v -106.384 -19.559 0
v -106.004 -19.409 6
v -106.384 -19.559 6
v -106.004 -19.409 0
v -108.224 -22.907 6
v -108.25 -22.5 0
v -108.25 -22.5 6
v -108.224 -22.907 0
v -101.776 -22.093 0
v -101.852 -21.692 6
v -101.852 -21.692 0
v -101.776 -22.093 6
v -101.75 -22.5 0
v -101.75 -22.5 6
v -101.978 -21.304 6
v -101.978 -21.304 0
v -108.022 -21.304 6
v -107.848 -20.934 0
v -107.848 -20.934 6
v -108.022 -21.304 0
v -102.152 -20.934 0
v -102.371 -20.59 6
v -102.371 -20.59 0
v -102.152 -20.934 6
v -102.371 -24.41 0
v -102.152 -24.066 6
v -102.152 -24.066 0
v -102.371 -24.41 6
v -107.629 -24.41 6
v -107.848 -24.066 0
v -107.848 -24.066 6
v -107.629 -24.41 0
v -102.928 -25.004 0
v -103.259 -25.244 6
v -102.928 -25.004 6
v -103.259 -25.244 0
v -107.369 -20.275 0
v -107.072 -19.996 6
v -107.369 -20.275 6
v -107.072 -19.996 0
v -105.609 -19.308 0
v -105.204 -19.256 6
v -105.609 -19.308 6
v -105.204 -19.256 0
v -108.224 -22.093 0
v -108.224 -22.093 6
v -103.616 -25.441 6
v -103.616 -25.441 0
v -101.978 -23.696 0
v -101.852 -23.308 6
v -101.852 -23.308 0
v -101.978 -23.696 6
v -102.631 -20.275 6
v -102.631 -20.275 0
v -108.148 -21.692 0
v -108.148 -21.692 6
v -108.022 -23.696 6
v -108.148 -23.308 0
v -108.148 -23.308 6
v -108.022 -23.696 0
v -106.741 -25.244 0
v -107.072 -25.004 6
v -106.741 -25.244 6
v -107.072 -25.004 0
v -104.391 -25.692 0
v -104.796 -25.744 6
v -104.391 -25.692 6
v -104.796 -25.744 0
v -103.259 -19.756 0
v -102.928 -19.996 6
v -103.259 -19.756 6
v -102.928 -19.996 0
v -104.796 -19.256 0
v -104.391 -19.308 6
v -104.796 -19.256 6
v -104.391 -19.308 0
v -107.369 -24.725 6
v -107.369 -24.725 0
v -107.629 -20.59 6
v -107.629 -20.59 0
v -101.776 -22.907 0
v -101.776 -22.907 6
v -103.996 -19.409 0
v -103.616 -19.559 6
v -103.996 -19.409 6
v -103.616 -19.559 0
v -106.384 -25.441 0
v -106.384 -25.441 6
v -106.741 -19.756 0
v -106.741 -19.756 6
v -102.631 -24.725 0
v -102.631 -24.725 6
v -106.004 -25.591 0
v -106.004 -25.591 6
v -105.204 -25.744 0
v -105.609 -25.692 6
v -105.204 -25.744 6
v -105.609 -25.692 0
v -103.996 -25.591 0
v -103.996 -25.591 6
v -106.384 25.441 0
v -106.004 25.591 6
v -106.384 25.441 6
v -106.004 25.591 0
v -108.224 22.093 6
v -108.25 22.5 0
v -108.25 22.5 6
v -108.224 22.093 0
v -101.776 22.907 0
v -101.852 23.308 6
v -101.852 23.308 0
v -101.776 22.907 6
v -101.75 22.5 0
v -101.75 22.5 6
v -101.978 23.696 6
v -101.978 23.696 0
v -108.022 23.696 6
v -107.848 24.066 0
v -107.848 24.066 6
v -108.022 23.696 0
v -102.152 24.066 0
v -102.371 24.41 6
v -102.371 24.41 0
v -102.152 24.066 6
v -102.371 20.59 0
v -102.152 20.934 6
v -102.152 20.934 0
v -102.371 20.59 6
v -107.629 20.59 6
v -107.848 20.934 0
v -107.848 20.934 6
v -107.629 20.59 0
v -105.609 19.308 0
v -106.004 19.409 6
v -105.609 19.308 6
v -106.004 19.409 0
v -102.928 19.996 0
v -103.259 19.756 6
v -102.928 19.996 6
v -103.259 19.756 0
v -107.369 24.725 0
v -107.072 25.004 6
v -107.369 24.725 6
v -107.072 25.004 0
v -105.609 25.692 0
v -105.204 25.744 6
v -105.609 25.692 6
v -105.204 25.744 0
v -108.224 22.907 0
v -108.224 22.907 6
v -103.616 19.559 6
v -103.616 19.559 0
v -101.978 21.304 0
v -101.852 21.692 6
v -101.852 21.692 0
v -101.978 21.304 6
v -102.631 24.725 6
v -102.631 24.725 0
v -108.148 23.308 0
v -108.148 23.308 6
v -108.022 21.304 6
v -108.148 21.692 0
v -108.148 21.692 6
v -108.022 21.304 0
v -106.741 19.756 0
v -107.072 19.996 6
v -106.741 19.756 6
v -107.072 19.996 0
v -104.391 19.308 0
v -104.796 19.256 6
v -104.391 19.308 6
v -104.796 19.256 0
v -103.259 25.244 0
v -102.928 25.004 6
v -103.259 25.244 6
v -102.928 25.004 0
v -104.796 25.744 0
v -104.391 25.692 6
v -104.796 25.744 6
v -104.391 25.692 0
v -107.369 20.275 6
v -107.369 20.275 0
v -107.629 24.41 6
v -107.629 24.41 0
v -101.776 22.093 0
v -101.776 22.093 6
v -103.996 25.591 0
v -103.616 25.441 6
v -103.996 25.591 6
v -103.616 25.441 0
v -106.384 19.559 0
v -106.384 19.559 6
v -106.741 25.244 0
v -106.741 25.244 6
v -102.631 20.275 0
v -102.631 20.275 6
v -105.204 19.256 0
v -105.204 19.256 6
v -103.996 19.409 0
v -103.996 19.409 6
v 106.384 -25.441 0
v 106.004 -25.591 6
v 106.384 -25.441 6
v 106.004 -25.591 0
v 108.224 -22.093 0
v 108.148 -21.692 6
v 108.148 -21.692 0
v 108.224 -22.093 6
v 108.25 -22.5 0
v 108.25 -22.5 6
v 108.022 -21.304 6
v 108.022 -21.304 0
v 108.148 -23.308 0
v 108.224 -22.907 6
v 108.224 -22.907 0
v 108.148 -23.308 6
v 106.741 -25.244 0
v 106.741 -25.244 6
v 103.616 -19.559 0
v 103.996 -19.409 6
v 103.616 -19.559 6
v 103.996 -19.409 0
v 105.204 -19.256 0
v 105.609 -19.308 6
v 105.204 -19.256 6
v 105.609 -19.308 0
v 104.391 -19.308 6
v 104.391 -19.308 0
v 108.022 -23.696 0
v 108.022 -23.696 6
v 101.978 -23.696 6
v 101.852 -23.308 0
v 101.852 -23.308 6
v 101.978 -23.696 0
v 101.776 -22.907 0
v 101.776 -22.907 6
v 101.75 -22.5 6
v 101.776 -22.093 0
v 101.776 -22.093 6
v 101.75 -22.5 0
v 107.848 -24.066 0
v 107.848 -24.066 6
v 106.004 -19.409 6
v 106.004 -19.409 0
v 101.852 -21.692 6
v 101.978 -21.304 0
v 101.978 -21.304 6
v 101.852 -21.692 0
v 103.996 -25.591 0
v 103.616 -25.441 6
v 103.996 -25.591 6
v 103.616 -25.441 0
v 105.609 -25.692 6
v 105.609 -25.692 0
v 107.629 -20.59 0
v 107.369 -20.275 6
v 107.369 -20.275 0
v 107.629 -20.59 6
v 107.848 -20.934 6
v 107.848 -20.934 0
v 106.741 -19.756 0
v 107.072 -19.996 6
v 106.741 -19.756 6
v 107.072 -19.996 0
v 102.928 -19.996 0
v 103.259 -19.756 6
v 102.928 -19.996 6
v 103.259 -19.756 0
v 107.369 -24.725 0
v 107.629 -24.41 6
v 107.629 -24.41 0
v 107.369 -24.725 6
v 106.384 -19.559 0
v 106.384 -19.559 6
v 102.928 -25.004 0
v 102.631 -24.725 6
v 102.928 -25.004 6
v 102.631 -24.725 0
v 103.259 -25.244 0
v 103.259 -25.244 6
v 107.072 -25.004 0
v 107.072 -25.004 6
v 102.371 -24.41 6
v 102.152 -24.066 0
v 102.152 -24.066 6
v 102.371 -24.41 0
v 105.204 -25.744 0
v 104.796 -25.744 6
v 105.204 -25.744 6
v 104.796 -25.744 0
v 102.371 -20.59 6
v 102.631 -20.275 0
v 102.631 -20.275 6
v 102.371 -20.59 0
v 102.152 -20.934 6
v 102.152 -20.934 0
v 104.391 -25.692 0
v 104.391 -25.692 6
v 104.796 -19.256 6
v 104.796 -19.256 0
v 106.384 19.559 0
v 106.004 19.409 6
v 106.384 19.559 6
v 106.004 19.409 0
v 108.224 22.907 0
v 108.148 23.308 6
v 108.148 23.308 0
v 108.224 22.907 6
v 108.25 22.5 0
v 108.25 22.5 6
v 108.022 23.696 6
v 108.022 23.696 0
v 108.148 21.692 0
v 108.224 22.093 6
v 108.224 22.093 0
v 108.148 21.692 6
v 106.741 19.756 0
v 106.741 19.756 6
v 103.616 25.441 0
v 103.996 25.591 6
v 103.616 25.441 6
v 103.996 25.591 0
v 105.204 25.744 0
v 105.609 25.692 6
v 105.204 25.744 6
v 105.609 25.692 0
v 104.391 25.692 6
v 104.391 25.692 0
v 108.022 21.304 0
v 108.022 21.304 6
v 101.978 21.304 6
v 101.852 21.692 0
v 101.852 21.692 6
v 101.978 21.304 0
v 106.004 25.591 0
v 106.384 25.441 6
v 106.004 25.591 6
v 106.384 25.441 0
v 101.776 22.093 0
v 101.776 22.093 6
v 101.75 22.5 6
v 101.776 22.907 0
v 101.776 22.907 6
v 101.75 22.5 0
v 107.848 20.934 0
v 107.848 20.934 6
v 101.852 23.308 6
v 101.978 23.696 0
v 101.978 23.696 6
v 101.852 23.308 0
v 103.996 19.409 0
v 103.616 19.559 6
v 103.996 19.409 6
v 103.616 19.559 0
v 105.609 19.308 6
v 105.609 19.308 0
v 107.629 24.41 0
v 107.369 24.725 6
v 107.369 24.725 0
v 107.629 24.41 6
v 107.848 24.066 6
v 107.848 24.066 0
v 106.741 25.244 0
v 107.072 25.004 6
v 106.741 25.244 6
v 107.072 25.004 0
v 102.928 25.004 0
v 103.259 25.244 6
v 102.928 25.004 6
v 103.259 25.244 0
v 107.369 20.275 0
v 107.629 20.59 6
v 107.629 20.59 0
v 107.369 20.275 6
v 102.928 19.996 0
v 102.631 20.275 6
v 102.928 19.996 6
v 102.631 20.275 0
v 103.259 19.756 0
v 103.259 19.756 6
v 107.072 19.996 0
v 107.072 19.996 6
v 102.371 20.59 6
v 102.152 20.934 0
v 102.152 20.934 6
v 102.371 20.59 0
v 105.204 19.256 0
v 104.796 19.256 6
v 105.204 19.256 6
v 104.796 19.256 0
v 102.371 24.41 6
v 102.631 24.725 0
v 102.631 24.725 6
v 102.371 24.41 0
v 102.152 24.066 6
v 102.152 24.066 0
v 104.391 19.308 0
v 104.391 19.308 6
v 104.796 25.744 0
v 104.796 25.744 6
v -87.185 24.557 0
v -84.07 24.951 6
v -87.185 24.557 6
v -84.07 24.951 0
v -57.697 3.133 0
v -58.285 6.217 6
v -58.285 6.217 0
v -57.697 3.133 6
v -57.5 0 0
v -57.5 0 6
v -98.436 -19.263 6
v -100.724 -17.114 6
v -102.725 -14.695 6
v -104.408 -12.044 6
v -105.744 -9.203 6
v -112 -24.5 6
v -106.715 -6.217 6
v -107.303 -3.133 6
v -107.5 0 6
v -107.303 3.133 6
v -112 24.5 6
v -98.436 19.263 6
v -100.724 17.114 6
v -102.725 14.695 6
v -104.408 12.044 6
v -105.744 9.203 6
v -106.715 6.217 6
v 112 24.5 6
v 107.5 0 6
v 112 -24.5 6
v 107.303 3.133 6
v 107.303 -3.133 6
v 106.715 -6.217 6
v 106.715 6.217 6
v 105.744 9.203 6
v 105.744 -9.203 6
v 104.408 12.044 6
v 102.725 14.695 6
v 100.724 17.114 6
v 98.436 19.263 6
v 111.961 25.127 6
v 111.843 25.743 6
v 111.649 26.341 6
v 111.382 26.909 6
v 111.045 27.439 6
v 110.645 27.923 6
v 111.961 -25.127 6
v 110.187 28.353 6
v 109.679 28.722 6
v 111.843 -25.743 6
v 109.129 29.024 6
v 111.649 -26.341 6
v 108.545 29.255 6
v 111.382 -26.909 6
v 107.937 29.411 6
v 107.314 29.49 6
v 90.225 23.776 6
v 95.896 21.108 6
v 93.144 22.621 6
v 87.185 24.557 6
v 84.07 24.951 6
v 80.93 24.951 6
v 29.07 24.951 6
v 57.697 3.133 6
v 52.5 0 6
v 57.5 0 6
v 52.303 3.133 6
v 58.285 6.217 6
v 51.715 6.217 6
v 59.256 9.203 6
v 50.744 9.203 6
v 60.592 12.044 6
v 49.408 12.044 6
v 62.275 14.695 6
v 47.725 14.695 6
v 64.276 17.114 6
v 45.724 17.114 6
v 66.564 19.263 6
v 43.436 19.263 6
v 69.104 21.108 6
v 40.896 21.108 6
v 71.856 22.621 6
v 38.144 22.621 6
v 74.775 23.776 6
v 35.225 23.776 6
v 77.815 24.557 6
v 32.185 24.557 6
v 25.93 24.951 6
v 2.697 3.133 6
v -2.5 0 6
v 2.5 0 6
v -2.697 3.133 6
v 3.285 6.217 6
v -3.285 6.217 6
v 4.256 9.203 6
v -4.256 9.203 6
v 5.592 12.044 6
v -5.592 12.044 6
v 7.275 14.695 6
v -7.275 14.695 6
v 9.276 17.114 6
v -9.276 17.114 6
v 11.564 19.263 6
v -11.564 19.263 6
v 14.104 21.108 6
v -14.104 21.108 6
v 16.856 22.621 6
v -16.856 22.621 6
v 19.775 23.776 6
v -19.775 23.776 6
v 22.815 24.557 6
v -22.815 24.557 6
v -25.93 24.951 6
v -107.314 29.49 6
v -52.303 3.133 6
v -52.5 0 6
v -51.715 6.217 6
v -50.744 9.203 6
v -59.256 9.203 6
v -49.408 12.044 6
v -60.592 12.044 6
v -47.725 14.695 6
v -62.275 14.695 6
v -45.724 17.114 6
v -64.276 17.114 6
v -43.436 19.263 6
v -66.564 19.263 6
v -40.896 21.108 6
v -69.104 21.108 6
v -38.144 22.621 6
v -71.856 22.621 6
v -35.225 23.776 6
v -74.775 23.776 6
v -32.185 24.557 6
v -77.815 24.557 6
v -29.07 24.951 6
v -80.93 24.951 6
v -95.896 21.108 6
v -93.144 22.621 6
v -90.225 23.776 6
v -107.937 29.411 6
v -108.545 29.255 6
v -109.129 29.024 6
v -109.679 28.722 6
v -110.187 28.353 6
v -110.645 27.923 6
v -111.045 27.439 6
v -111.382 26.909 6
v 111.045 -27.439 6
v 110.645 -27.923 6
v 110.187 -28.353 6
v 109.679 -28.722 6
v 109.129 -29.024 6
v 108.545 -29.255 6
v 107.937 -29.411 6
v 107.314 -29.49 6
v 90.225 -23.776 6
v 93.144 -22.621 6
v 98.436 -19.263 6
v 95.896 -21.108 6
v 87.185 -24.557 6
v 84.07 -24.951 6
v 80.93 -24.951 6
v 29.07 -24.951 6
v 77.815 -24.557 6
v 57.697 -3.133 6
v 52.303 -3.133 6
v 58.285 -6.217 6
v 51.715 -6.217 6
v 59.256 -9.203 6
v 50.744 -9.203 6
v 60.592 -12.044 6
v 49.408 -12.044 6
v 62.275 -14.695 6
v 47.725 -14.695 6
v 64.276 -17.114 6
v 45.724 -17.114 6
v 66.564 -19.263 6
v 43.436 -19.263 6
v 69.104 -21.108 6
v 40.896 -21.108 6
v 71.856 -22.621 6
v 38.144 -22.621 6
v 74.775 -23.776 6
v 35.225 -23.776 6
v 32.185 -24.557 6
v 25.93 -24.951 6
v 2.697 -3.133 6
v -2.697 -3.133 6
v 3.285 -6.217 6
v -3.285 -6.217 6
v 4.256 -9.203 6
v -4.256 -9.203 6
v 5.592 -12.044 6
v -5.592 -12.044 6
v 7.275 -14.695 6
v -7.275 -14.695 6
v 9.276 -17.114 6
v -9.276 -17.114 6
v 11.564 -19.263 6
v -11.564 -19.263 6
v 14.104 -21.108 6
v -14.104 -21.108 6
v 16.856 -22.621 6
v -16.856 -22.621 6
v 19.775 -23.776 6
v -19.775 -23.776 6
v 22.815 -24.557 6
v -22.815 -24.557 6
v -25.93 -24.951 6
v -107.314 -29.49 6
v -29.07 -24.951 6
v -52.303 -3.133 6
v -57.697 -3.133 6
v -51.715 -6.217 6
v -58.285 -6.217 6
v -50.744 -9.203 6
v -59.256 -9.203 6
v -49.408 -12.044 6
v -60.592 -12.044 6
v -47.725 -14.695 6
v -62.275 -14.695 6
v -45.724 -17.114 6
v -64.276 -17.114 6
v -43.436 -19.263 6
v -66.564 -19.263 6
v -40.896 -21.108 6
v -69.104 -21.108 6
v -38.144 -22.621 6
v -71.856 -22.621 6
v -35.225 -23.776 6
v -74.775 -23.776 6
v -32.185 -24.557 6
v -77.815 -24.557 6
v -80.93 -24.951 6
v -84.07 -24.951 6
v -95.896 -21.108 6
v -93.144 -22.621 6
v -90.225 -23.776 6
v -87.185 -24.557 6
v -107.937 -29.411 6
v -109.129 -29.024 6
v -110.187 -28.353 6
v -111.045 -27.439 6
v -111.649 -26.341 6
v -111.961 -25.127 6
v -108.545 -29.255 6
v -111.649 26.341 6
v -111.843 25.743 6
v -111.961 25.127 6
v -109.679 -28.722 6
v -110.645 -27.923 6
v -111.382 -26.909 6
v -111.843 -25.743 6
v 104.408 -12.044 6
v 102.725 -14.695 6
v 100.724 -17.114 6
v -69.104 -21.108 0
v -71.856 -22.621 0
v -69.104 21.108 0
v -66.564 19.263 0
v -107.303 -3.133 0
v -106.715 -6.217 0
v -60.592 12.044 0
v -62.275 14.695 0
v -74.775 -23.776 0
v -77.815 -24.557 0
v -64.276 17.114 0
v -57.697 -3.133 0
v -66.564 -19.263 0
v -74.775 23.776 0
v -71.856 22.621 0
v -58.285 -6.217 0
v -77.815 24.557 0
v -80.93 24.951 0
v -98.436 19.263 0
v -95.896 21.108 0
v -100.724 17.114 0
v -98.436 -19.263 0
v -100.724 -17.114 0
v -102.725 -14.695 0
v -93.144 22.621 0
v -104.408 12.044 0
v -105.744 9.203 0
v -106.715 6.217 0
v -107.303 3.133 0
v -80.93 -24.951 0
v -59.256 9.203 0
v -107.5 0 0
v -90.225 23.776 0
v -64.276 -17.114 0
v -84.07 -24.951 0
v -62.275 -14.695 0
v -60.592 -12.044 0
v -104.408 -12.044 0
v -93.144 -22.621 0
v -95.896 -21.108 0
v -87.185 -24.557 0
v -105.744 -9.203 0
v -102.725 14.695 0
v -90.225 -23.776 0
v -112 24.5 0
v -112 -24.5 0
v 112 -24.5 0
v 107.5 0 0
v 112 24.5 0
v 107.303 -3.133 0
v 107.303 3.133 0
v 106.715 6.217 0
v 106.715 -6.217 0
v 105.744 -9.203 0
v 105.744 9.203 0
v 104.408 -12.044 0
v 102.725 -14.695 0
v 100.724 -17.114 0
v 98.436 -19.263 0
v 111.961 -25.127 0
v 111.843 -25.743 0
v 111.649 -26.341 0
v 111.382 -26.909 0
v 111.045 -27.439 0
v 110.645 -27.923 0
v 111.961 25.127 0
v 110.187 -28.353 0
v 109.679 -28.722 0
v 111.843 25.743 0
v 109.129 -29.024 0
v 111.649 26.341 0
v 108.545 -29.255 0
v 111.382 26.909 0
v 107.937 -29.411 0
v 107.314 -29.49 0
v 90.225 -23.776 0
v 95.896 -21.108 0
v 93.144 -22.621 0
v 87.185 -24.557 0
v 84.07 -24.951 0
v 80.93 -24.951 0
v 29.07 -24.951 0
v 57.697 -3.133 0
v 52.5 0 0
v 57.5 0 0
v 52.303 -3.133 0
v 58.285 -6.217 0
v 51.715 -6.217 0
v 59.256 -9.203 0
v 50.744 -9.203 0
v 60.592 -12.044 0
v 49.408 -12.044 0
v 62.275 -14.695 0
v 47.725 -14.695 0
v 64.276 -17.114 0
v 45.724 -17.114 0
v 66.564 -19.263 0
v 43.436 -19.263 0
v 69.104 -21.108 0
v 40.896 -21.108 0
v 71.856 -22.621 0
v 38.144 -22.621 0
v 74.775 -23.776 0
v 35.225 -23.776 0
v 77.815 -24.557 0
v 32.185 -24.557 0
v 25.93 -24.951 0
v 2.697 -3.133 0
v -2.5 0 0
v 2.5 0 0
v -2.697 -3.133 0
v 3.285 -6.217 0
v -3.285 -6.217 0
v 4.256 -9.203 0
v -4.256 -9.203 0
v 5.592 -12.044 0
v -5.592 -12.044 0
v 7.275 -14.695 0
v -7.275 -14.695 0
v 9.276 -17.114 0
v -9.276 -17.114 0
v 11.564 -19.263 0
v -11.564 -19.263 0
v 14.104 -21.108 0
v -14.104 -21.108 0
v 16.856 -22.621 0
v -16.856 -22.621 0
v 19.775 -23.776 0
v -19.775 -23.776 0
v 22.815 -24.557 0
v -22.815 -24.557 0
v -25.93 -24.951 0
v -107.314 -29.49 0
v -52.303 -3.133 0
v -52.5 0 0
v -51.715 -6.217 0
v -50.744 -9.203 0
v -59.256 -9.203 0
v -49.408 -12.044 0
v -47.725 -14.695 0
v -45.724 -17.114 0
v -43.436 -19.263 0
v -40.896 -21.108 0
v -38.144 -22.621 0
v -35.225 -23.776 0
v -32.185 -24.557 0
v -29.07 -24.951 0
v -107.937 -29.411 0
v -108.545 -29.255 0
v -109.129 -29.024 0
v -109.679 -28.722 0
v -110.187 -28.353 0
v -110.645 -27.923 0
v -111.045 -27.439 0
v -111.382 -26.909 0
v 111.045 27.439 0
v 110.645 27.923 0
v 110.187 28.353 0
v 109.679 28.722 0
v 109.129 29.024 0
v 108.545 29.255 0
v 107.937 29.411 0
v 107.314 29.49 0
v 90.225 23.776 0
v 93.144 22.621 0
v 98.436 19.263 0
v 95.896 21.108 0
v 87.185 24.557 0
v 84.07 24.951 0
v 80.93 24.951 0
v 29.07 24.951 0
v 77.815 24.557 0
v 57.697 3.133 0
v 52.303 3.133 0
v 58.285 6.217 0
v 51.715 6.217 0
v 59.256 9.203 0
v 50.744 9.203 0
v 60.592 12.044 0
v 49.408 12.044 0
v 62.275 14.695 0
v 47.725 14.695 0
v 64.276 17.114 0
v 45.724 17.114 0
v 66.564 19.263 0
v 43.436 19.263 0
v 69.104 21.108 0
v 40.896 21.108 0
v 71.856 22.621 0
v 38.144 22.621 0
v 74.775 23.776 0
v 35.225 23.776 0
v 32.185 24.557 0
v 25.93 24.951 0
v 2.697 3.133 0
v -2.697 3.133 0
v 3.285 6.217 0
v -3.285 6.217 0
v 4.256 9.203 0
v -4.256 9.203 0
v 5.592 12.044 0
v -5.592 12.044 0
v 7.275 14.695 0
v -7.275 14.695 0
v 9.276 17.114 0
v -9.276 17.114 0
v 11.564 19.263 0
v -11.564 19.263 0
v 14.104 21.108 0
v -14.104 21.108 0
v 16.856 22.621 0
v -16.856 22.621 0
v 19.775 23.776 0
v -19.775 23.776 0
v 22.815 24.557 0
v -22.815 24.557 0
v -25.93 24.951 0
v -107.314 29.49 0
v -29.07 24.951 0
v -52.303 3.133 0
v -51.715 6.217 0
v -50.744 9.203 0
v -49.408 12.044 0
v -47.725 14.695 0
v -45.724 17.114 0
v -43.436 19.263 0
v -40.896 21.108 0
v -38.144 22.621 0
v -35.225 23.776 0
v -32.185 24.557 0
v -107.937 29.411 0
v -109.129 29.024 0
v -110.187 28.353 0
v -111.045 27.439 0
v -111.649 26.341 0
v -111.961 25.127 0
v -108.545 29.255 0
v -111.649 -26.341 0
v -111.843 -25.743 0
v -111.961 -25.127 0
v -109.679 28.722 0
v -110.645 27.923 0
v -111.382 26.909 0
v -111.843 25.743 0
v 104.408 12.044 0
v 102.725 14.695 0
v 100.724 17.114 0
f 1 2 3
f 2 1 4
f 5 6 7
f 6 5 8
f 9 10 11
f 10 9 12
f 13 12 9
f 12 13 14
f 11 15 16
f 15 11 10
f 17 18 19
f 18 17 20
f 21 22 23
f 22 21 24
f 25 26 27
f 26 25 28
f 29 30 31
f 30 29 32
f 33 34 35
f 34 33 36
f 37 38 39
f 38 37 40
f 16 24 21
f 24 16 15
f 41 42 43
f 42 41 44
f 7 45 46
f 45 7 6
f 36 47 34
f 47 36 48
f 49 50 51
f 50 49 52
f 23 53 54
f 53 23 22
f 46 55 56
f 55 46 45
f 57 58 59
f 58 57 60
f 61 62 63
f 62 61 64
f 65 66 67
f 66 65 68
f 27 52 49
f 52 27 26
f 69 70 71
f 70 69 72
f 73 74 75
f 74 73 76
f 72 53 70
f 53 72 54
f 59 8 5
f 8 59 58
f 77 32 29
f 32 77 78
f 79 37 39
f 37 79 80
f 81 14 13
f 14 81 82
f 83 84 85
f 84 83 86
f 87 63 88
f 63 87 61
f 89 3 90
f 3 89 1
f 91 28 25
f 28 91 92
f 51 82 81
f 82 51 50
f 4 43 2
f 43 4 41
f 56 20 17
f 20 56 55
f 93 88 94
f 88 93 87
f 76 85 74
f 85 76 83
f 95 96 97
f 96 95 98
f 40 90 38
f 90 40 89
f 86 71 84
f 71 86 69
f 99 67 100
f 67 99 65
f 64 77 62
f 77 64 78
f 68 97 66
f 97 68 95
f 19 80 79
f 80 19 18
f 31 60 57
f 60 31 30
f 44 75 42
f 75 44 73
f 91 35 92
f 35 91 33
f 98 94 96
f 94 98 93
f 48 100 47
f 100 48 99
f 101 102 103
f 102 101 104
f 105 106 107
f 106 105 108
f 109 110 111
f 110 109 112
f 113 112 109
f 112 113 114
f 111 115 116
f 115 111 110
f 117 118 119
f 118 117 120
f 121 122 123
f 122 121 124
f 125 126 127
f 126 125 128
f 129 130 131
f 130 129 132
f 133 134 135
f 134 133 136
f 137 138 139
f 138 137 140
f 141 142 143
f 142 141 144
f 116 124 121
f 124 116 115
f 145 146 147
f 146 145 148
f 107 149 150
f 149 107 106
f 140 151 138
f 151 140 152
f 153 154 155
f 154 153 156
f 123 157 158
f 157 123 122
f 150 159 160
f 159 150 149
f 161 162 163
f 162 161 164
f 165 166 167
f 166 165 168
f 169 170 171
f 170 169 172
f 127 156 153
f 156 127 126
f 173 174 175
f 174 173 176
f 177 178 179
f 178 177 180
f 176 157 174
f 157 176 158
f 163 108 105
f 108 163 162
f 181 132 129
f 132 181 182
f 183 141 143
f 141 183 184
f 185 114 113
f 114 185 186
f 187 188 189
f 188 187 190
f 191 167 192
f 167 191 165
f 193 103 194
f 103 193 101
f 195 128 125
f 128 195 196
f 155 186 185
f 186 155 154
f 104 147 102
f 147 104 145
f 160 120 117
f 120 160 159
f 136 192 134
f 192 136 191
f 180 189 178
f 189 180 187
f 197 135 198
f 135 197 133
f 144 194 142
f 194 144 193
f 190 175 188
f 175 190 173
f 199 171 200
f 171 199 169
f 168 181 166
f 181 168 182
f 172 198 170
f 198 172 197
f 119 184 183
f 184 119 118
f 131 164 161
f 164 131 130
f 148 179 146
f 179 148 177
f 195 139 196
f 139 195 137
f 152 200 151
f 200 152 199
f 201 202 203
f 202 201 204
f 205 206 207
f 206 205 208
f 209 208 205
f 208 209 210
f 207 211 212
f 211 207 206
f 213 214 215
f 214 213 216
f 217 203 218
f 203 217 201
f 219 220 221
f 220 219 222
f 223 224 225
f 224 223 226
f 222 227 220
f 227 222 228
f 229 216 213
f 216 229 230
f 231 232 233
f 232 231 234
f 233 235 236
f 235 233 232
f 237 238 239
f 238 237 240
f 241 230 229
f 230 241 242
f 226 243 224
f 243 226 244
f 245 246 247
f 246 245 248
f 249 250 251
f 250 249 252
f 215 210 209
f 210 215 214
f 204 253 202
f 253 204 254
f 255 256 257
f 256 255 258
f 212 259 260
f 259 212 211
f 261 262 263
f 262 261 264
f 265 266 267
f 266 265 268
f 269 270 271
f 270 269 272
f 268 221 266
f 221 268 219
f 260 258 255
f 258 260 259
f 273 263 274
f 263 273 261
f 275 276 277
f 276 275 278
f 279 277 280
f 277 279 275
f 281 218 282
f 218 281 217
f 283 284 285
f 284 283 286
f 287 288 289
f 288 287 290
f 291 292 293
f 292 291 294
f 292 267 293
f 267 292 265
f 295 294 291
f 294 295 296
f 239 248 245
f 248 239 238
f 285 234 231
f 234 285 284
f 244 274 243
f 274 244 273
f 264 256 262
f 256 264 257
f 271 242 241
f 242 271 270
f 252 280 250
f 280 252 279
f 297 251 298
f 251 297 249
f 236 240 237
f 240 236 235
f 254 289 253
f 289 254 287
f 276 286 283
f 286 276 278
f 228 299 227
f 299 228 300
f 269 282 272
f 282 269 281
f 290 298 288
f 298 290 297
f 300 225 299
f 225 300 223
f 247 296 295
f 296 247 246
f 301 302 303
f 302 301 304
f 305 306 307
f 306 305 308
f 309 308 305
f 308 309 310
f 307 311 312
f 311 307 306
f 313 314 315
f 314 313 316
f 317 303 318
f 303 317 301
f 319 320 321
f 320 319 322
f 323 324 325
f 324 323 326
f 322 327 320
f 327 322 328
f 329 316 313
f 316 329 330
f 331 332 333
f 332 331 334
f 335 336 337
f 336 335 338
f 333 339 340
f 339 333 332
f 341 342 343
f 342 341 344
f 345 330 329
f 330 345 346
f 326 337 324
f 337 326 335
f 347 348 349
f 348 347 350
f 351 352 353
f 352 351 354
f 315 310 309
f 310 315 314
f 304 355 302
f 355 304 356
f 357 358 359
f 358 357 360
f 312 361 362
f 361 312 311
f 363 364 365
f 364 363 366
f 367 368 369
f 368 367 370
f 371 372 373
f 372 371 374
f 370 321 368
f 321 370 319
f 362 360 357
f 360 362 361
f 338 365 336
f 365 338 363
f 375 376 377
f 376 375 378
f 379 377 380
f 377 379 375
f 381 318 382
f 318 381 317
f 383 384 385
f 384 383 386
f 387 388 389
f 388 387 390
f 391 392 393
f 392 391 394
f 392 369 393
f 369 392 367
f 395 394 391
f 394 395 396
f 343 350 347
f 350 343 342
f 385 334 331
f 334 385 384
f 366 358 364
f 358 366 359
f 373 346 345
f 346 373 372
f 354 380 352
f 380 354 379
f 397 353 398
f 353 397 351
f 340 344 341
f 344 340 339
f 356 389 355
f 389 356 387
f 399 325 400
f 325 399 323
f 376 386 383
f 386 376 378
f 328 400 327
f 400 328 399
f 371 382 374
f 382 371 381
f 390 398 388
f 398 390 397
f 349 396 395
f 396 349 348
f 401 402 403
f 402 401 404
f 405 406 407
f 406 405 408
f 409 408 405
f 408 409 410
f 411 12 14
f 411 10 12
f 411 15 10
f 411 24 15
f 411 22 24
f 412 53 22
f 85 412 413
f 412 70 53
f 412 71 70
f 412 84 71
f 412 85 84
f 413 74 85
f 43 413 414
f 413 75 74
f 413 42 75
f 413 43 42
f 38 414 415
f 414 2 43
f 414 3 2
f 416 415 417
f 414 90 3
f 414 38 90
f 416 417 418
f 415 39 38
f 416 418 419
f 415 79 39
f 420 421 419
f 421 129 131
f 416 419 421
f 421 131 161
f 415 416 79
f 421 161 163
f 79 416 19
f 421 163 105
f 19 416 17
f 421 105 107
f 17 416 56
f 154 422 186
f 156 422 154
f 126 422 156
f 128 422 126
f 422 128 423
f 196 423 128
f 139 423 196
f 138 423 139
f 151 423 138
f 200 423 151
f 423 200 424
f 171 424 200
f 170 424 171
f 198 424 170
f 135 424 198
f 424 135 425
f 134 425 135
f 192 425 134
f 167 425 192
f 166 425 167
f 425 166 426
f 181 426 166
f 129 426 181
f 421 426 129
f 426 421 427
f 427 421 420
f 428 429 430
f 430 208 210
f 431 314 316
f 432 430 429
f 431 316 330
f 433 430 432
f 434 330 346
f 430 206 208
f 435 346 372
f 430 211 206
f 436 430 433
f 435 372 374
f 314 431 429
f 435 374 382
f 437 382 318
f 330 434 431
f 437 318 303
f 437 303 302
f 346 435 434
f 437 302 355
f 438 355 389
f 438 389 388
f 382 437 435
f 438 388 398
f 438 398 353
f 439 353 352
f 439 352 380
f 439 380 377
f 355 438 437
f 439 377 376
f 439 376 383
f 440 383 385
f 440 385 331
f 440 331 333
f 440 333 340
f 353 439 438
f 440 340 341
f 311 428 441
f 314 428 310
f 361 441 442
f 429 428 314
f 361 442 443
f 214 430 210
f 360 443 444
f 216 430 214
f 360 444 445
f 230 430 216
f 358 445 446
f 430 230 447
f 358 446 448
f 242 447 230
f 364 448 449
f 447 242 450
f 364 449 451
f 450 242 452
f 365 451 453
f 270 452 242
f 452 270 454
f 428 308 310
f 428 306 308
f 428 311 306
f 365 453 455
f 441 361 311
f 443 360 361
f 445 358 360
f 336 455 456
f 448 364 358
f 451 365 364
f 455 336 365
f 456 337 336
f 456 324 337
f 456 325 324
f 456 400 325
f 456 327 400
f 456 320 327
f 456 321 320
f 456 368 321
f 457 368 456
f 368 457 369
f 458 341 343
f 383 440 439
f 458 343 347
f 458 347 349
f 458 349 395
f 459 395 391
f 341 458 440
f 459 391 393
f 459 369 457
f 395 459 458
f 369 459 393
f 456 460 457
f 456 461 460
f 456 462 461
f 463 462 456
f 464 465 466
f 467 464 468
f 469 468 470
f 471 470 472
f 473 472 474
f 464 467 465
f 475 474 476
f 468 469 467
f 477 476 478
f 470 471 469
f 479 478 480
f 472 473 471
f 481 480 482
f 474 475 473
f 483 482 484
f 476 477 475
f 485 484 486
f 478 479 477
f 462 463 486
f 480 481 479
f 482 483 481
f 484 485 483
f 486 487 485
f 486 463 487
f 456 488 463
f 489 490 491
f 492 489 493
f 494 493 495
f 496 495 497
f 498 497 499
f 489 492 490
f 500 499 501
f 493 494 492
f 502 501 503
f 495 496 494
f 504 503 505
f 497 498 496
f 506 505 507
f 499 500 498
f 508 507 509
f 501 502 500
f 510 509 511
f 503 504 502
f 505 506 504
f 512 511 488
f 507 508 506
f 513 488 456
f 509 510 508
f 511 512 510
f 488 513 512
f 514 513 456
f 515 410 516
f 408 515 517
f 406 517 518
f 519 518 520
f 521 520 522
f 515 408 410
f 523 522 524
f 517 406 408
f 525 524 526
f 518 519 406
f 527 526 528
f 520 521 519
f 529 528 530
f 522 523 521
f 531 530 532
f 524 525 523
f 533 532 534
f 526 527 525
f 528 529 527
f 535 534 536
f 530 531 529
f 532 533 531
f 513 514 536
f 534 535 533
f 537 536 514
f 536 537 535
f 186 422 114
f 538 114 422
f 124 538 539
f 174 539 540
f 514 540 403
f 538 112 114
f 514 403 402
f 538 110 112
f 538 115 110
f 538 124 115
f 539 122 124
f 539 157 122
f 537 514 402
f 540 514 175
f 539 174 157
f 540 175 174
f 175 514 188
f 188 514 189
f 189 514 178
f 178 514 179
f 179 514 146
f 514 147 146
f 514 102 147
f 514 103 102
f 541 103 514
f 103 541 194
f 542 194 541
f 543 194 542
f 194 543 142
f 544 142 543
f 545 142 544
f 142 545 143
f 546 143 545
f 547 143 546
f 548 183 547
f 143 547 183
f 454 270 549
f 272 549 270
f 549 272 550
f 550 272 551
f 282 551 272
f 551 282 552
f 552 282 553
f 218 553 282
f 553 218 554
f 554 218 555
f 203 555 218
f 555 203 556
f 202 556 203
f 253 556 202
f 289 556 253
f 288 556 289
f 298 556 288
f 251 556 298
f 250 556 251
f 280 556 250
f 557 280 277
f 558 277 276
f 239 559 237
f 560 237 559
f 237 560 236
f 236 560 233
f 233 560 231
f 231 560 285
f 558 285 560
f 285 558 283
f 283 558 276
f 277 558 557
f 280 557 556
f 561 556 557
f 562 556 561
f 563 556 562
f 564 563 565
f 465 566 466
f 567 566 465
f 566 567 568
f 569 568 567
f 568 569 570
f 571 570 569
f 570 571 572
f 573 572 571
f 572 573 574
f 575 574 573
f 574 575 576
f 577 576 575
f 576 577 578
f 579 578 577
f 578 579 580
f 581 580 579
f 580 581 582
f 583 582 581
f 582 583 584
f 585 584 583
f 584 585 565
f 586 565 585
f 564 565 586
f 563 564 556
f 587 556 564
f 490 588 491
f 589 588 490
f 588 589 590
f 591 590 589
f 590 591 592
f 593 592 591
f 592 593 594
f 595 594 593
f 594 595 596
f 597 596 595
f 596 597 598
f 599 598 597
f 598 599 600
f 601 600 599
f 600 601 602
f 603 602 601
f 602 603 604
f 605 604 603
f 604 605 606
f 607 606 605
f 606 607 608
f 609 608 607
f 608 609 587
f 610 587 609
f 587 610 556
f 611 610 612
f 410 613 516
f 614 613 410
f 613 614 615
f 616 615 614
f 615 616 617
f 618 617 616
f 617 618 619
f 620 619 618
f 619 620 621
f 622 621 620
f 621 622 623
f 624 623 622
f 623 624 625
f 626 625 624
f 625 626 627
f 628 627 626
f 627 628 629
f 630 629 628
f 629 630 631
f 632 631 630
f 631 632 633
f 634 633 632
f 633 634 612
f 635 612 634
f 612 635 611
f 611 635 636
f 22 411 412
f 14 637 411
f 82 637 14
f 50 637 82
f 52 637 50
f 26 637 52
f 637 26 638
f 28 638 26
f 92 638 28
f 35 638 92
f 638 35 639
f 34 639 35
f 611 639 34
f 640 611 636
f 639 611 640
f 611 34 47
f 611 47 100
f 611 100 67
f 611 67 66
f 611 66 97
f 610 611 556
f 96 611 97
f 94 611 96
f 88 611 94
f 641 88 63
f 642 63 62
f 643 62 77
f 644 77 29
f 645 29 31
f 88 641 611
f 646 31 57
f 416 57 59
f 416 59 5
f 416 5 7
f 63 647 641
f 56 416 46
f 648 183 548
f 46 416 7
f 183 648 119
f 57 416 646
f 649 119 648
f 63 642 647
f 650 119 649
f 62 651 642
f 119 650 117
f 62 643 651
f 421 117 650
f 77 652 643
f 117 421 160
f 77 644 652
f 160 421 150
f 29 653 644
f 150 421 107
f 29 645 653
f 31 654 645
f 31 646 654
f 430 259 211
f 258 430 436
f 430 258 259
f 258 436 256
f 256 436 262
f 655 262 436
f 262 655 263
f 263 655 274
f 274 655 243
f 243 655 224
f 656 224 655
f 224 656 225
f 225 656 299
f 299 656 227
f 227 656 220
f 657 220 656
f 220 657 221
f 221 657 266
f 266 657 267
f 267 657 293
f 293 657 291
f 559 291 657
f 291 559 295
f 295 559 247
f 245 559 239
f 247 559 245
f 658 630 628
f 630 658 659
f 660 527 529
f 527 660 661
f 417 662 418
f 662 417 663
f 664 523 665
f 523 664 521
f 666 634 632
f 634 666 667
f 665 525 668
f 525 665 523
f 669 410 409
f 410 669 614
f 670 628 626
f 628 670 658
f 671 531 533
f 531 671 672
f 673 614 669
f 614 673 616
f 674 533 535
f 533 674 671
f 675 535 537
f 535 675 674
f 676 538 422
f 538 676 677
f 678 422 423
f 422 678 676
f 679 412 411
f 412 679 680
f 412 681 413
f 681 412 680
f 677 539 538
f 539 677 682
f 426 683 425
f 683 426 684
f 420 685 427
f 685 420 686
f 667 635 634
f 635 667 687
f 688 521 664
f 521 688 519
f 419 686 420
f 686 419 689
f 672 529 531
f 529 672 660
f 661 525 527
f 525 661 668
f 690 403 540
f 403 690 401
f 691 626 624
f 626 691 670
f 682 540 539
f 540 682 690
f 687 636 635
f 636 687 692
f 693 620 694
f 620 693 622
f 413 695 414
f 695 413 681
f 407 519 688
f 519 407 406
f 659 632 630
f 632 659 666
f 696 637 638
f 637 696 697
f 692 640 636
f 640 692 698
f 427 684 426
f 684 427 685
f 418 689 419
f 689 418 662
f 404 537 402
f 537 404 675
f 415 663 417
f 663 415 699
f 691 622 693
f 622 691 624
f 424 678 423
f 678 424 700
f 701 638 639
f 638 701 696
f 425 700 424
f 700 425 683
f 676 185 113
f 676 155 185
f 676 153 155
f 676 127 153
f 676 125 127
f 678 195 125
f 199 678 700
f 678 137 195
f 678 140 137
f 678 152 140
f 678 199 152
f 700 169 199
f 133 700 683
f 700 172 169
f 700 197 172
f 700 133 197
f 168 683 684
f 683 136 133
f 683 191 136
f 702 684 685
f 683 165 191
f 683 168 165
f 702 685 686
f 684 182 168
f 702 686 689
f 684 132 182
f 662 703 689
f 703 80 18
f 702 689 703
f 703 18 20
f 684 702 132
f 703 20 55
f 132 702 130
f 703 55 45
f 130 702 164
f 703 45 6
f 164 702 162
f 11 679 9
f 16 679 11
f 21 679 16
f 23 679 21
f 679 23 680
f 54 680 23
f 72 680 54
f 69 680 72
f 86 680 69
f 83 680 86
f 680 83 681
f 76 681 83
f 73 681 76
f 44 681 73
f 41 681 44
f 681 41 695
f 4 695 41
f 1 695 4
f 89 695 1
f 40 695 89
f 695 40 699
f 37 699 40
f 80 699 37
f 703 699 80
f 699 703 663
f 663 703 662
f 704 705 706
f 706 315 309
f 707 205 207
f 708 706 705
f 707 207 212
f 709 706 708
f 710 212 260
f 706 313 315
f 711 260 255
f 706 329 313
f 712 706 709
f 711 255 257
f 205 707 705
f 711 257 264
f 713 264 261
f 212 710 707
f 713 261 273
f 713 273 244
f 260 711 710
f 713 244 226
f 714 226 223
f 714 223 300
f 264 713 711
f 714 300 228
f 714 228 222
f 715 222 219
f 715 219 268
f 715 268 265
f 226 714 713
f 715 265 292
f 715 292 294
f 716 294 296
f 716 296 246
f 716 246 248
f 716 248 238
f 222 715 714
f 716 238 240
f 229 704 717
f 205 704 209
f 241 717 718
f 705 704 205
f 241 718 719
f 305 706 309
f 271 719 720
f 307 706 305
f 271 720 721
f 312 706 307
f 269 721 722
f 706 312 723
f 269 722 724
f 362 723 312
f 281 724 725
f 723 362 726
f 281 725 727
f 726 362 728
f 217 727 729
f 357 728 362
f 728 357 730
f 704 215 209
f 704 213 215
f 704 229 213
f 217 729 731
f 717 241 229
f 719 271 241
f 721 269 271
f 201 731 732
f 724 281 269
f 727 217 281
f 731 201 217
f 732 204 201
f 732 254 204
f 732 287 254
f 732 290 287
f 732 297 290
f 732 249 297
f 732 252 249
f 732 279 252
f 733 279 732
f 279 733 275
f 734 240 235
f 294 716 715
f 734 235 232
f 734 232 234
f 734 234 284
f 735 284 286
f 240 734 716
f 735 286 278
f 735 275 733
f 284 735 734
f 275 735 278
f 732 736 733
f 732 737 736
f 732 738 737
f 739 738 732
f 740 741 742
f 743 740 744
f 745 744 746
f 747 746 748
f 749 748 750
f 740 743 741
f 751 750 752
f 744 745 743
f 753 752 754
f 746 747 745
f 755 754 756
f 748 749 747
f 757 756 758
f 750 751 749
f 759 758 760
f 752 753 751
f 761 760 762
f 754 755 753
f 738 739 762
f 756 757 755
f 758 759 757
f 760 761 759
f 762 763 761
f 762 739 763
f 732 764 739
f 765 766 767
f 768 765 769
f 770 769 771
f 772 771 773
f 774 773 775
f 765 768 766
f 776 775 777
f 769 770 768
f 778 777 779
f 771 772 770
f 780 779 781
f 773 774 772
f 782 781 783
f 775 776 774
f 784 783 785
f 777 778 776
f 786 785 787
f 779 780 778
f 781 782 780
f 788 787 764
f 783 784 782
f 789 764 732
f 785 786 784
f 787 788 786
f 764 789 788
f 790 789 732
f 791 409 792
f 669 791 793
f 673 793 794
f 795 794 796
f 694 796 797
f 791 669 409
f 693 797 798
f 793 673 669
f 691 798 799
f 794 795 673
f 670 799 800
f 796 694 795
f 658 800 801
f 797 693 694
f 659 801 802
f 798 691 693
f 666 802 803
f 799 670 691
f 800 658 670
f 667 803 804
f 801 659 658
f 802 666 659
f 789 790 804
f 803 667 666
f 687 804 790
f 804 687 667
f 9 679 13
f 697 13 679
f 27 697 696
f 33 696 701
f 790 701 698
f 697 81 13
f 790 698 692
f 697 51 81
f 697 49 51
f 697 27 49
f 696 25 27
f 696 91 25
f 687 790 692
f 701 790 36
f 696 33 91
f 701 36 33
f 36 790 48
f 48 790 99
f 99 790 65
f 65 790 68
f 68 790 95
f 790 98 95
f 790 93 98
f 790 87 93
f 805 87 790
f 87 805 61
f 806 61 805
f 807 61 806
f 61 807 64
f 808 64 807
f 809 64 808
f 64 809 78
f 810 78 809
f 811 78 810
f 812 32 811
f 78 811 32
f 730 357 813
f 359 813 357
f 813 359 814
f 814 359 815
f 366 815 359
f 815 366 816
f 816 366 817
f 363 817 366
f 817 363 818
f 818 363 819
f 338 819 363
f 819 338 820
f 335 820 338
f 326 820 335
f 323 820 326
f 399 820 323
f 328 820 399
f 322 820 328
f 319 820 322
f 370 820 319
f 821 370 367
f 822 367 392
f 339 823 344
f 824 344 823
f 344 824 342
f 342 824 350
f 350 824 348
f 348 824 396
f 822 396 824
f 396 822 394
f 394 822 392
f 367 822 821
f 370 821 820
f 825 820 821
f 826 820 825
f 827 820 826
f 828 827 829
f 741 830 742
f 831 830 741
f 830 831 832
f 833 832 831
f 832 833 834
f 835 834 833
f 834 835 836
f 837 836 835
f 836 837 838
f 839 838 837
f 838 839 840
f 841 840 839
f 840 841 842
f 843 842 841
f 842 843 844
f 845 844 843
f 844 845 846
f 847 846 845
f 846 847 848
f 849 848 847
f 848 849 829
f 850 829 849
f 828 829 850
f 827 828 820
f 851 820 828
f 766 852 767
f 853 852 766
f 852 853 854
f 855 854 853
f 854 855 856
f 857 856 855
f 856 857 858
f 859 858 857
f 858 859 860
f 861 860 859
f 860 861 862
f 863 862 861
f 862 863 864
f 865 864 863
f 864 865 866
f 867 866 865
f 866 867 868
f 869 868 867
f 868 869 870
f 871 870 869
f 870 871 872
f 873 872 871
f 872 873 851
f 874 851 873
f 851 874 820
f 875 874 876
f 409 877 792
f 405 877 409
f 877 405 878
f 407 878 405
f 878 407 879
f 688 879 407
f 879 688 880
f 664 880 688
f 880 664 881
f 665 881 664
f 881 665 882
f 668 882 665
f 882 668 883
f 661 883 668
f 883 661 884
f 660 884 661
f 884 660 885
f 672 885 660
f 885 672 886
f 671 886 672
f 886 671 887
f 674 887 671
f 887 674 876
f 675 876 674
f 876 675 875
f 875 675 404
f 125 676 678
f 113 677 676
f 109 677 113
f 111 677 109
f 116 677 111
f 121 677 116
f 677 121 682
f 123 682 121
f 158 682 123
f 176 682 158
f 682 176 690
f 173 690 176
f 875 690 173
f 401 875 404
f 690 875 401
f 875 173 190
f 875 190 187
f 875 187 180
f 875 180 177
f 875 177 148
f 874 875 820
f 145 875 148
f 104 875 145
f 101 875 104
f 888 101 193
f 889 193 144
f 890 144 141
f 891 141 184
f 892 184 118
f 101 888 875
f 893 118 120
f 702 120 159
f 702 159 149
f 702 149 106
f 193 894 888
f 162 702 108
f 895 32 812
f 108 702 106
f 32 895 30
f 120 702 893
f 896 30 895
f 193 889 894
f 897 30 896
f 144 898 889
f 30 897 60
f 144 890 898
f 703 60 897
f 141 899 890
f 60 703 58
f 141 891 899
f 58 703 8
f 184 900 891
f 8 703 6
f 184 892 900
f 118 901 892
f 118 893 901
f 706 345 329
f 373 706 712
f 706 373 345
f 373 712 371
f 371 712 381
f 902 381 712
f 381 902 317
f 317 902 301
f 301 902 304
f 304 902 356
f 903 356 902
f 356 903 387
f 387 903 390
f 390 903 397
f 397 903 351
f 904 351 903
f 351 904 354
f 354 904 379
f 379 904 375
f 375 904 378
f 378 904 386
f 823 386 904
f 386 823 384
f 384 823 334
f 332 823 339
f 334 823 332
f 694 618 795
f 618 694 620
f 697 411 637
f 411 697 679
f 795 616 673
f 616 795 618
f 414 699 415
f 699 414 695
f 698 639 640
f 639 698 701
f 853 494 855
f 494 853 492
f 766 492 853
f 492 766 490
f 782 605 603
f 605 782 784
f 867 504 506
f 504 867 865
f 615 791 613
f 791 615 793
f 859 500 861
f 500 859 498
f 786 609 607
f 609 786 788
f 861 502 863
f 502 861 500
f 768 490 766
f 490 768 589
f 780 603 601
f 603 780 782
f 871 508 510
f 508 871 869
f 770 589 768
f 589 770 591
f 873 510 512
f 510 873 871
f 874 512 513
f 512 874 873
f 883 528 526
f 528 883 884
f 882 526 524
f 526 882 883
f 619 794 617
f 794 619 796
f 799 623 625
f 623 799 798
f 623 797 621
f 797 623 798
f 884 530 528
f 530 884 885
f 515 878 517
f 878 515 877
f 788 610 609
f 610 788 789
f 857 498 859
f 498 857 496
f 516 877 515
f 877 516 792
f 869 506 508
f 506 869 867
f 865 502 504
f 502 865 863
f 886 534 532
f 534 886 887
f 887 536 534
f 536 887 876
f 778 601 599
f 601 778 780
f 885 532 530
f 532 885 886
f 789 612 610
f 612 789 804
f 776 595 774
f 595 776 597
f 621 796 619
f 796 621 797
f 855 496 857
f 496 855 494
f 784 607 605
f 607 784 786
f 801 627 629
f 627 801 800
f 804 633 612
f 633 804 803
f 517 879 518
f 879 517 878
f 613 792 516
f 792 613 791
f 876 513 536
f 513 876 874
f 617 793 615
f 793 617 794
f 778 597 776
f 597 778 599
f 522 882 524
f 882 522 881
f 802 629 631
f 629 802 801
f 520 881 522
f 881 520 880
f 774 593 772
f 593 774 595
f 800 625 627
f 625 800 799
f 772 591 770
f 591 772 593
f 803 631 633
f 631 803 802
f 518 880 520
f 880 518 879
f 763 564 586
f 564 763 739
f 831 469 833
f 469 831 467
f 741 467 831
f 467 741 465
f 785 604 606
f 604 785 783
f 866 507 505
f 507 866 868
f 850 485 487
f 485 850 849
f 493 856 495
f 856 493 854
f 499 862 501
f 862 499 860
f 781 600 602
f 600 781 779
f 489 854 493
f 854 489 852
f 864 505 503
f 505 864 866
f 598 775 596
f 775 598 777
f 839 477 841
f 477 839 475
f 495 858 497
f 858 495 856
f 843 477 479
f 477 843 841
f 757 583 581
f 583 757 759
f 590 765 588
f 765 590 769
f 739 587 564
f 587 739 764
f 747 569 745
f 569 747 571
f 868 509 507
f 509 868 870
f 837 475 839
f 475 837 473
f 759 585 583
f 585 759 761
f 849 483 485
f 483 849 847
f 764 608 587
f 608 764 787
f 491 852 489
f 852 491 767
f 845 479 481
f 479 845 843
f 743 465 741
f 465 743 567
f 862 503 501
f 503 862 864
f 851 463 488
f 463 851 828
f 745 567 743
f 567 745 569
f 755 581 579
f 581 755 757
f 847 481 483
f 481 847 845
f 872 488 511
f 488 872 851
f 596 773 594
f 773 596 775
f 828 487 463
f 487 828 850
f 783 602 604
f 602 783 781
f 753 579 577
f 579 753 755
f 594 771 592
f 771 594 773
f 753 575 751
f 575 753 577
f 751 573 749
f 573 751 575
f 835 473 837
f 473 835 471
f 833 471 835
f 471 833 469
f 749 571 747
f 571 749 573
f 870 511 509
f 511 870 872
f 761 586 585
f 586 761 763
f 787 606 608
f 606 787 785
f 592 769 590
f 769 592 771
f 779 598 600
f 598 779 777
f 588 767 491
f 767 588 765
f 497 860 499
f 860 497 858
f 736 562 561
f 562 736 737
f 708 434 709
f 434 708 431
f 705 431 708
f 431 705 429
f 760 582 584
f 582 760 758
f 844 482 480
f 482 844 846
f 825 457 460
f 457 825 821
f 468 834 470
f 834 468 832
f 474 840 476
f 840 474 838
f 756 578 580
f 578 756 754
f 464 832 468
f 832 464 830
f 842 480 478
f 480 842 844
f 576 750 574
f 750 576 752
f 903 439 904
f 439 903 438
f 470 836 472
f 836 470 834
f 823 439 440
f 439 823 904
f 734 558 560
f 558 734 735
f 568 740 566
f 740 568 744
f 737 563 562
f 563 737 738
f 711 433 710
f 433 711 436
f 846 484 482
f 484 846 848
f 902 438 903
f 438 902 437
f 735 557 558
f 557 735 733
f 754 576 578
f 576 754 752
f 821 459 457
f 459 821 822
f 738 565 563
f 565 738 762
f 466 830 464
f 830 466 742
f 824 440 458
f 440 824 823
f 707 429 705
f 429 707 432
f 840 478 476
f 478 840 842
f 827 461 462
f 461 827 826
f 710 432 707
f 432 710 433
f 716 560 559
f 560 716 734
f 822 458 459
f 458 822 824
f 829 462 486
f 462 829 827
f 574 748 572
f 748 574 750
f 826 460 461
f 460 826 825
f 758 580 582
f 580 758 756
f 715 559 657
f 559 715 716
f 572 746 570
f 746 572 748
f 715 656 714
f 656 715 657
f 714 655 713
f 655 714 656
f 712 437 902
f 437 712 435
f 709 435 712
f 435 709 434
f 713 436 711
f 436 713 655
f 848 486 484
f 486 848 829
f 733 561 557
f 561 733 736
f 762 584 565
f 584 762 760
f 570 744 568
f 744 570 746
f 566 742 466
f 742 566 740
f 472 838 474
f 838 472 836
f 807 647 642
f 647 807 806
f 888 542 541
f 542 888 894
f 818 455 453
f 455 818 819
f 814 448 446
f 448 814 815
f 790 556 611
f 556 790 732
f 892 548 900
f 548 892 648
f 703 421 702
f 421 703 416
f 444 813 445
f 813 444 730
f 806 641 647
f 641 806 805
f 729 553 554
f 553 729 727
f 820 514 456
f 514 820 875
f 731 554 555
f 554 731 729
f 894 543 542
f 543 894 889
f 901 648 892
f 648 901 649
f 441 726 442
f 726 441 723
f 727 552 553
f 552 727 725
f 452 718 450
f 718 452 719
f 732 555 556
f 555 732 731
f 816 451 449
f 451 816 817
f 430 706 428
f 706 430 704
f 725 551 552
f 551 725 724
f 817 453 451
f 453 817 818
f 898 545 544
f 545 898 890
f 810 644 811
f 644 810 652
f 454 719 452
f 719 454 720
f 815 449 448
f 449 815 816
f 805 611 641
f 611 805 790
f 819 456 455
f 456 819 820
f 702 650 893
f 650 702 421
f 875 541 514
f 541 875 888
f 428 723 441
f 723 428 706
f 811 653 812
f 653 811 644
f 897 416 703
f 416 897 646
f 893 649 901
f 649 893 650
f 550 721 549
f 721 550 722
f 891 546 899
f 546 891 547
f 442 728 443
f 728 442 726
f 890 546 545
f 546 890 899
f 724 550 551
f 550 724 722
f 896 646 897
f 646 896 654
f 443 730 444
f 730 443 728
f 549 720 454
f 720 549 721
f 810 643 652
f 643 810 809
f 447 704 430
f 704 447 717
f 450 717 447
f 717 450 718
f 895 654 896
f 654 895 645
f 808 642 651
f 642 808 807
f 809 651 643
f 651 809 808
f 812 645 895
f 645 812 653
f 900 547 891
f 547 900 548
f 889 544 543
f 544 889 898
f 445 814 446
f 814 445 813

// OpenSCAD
$fn = 50;


difference() {
	union() {
		hull() {
			translate(v = [-107.0000000000, 24.5000000000, 0]) {
				cylinder(h = 6, r = 5);
			}
			translate(v = [107.0000000000, 24.5000000000, 0]) {
				cylinder(h = 6, r = 5);
			}
			translate(v = [-107.0000000000, -24.5000000000, 0]) {
				cylinder(h = 6, r = 5);
			}
			translate(v = [107.0000000000, -24.5000000000, 0]) {
				cylinder(h = 6, r = 5);
			}
		}
	}
	union() {
		#translate(v = [-105.0000000000, -22.5000000000, -100.0000000000]) {
			cylinder(h = 200, r = 3.2500000000);
		}
		#translate(v = [-105.0000000000, 22.5000000000, -100.0000000000]) {
			cylinder(h = 200, r = 3.2500000000);
		}
		#translate(v = [105.0000000000, -22.5000000000, -100.0000000000]) {
			cylinder(h = 200, r = 3.2500000000);
		}
		#translate(v = [105.0000000000, 22.5000000000, -100.0000000000]) {
			cylinder(h = 200, r = 3.2500000000);
		}
		#translate(v = [-82.5000000000, 0, 0]) {
			cylinder(h = 6, r = 25.0000000000);
		}
		#translate(v = [-27.5000000000, 0, 0]) {
			cylinder(h = 6, r = 25.0000000000);
		}
		#translate(v = [27.5000000000, 0, 0]) {
			cylinder(h = 6, r = 25.0000000000);
		}
		#translate(v = [82.5000000000, 0, 0]) {
			cylinder(h = 6, r = 25.0000000000);
		}
	}
}
